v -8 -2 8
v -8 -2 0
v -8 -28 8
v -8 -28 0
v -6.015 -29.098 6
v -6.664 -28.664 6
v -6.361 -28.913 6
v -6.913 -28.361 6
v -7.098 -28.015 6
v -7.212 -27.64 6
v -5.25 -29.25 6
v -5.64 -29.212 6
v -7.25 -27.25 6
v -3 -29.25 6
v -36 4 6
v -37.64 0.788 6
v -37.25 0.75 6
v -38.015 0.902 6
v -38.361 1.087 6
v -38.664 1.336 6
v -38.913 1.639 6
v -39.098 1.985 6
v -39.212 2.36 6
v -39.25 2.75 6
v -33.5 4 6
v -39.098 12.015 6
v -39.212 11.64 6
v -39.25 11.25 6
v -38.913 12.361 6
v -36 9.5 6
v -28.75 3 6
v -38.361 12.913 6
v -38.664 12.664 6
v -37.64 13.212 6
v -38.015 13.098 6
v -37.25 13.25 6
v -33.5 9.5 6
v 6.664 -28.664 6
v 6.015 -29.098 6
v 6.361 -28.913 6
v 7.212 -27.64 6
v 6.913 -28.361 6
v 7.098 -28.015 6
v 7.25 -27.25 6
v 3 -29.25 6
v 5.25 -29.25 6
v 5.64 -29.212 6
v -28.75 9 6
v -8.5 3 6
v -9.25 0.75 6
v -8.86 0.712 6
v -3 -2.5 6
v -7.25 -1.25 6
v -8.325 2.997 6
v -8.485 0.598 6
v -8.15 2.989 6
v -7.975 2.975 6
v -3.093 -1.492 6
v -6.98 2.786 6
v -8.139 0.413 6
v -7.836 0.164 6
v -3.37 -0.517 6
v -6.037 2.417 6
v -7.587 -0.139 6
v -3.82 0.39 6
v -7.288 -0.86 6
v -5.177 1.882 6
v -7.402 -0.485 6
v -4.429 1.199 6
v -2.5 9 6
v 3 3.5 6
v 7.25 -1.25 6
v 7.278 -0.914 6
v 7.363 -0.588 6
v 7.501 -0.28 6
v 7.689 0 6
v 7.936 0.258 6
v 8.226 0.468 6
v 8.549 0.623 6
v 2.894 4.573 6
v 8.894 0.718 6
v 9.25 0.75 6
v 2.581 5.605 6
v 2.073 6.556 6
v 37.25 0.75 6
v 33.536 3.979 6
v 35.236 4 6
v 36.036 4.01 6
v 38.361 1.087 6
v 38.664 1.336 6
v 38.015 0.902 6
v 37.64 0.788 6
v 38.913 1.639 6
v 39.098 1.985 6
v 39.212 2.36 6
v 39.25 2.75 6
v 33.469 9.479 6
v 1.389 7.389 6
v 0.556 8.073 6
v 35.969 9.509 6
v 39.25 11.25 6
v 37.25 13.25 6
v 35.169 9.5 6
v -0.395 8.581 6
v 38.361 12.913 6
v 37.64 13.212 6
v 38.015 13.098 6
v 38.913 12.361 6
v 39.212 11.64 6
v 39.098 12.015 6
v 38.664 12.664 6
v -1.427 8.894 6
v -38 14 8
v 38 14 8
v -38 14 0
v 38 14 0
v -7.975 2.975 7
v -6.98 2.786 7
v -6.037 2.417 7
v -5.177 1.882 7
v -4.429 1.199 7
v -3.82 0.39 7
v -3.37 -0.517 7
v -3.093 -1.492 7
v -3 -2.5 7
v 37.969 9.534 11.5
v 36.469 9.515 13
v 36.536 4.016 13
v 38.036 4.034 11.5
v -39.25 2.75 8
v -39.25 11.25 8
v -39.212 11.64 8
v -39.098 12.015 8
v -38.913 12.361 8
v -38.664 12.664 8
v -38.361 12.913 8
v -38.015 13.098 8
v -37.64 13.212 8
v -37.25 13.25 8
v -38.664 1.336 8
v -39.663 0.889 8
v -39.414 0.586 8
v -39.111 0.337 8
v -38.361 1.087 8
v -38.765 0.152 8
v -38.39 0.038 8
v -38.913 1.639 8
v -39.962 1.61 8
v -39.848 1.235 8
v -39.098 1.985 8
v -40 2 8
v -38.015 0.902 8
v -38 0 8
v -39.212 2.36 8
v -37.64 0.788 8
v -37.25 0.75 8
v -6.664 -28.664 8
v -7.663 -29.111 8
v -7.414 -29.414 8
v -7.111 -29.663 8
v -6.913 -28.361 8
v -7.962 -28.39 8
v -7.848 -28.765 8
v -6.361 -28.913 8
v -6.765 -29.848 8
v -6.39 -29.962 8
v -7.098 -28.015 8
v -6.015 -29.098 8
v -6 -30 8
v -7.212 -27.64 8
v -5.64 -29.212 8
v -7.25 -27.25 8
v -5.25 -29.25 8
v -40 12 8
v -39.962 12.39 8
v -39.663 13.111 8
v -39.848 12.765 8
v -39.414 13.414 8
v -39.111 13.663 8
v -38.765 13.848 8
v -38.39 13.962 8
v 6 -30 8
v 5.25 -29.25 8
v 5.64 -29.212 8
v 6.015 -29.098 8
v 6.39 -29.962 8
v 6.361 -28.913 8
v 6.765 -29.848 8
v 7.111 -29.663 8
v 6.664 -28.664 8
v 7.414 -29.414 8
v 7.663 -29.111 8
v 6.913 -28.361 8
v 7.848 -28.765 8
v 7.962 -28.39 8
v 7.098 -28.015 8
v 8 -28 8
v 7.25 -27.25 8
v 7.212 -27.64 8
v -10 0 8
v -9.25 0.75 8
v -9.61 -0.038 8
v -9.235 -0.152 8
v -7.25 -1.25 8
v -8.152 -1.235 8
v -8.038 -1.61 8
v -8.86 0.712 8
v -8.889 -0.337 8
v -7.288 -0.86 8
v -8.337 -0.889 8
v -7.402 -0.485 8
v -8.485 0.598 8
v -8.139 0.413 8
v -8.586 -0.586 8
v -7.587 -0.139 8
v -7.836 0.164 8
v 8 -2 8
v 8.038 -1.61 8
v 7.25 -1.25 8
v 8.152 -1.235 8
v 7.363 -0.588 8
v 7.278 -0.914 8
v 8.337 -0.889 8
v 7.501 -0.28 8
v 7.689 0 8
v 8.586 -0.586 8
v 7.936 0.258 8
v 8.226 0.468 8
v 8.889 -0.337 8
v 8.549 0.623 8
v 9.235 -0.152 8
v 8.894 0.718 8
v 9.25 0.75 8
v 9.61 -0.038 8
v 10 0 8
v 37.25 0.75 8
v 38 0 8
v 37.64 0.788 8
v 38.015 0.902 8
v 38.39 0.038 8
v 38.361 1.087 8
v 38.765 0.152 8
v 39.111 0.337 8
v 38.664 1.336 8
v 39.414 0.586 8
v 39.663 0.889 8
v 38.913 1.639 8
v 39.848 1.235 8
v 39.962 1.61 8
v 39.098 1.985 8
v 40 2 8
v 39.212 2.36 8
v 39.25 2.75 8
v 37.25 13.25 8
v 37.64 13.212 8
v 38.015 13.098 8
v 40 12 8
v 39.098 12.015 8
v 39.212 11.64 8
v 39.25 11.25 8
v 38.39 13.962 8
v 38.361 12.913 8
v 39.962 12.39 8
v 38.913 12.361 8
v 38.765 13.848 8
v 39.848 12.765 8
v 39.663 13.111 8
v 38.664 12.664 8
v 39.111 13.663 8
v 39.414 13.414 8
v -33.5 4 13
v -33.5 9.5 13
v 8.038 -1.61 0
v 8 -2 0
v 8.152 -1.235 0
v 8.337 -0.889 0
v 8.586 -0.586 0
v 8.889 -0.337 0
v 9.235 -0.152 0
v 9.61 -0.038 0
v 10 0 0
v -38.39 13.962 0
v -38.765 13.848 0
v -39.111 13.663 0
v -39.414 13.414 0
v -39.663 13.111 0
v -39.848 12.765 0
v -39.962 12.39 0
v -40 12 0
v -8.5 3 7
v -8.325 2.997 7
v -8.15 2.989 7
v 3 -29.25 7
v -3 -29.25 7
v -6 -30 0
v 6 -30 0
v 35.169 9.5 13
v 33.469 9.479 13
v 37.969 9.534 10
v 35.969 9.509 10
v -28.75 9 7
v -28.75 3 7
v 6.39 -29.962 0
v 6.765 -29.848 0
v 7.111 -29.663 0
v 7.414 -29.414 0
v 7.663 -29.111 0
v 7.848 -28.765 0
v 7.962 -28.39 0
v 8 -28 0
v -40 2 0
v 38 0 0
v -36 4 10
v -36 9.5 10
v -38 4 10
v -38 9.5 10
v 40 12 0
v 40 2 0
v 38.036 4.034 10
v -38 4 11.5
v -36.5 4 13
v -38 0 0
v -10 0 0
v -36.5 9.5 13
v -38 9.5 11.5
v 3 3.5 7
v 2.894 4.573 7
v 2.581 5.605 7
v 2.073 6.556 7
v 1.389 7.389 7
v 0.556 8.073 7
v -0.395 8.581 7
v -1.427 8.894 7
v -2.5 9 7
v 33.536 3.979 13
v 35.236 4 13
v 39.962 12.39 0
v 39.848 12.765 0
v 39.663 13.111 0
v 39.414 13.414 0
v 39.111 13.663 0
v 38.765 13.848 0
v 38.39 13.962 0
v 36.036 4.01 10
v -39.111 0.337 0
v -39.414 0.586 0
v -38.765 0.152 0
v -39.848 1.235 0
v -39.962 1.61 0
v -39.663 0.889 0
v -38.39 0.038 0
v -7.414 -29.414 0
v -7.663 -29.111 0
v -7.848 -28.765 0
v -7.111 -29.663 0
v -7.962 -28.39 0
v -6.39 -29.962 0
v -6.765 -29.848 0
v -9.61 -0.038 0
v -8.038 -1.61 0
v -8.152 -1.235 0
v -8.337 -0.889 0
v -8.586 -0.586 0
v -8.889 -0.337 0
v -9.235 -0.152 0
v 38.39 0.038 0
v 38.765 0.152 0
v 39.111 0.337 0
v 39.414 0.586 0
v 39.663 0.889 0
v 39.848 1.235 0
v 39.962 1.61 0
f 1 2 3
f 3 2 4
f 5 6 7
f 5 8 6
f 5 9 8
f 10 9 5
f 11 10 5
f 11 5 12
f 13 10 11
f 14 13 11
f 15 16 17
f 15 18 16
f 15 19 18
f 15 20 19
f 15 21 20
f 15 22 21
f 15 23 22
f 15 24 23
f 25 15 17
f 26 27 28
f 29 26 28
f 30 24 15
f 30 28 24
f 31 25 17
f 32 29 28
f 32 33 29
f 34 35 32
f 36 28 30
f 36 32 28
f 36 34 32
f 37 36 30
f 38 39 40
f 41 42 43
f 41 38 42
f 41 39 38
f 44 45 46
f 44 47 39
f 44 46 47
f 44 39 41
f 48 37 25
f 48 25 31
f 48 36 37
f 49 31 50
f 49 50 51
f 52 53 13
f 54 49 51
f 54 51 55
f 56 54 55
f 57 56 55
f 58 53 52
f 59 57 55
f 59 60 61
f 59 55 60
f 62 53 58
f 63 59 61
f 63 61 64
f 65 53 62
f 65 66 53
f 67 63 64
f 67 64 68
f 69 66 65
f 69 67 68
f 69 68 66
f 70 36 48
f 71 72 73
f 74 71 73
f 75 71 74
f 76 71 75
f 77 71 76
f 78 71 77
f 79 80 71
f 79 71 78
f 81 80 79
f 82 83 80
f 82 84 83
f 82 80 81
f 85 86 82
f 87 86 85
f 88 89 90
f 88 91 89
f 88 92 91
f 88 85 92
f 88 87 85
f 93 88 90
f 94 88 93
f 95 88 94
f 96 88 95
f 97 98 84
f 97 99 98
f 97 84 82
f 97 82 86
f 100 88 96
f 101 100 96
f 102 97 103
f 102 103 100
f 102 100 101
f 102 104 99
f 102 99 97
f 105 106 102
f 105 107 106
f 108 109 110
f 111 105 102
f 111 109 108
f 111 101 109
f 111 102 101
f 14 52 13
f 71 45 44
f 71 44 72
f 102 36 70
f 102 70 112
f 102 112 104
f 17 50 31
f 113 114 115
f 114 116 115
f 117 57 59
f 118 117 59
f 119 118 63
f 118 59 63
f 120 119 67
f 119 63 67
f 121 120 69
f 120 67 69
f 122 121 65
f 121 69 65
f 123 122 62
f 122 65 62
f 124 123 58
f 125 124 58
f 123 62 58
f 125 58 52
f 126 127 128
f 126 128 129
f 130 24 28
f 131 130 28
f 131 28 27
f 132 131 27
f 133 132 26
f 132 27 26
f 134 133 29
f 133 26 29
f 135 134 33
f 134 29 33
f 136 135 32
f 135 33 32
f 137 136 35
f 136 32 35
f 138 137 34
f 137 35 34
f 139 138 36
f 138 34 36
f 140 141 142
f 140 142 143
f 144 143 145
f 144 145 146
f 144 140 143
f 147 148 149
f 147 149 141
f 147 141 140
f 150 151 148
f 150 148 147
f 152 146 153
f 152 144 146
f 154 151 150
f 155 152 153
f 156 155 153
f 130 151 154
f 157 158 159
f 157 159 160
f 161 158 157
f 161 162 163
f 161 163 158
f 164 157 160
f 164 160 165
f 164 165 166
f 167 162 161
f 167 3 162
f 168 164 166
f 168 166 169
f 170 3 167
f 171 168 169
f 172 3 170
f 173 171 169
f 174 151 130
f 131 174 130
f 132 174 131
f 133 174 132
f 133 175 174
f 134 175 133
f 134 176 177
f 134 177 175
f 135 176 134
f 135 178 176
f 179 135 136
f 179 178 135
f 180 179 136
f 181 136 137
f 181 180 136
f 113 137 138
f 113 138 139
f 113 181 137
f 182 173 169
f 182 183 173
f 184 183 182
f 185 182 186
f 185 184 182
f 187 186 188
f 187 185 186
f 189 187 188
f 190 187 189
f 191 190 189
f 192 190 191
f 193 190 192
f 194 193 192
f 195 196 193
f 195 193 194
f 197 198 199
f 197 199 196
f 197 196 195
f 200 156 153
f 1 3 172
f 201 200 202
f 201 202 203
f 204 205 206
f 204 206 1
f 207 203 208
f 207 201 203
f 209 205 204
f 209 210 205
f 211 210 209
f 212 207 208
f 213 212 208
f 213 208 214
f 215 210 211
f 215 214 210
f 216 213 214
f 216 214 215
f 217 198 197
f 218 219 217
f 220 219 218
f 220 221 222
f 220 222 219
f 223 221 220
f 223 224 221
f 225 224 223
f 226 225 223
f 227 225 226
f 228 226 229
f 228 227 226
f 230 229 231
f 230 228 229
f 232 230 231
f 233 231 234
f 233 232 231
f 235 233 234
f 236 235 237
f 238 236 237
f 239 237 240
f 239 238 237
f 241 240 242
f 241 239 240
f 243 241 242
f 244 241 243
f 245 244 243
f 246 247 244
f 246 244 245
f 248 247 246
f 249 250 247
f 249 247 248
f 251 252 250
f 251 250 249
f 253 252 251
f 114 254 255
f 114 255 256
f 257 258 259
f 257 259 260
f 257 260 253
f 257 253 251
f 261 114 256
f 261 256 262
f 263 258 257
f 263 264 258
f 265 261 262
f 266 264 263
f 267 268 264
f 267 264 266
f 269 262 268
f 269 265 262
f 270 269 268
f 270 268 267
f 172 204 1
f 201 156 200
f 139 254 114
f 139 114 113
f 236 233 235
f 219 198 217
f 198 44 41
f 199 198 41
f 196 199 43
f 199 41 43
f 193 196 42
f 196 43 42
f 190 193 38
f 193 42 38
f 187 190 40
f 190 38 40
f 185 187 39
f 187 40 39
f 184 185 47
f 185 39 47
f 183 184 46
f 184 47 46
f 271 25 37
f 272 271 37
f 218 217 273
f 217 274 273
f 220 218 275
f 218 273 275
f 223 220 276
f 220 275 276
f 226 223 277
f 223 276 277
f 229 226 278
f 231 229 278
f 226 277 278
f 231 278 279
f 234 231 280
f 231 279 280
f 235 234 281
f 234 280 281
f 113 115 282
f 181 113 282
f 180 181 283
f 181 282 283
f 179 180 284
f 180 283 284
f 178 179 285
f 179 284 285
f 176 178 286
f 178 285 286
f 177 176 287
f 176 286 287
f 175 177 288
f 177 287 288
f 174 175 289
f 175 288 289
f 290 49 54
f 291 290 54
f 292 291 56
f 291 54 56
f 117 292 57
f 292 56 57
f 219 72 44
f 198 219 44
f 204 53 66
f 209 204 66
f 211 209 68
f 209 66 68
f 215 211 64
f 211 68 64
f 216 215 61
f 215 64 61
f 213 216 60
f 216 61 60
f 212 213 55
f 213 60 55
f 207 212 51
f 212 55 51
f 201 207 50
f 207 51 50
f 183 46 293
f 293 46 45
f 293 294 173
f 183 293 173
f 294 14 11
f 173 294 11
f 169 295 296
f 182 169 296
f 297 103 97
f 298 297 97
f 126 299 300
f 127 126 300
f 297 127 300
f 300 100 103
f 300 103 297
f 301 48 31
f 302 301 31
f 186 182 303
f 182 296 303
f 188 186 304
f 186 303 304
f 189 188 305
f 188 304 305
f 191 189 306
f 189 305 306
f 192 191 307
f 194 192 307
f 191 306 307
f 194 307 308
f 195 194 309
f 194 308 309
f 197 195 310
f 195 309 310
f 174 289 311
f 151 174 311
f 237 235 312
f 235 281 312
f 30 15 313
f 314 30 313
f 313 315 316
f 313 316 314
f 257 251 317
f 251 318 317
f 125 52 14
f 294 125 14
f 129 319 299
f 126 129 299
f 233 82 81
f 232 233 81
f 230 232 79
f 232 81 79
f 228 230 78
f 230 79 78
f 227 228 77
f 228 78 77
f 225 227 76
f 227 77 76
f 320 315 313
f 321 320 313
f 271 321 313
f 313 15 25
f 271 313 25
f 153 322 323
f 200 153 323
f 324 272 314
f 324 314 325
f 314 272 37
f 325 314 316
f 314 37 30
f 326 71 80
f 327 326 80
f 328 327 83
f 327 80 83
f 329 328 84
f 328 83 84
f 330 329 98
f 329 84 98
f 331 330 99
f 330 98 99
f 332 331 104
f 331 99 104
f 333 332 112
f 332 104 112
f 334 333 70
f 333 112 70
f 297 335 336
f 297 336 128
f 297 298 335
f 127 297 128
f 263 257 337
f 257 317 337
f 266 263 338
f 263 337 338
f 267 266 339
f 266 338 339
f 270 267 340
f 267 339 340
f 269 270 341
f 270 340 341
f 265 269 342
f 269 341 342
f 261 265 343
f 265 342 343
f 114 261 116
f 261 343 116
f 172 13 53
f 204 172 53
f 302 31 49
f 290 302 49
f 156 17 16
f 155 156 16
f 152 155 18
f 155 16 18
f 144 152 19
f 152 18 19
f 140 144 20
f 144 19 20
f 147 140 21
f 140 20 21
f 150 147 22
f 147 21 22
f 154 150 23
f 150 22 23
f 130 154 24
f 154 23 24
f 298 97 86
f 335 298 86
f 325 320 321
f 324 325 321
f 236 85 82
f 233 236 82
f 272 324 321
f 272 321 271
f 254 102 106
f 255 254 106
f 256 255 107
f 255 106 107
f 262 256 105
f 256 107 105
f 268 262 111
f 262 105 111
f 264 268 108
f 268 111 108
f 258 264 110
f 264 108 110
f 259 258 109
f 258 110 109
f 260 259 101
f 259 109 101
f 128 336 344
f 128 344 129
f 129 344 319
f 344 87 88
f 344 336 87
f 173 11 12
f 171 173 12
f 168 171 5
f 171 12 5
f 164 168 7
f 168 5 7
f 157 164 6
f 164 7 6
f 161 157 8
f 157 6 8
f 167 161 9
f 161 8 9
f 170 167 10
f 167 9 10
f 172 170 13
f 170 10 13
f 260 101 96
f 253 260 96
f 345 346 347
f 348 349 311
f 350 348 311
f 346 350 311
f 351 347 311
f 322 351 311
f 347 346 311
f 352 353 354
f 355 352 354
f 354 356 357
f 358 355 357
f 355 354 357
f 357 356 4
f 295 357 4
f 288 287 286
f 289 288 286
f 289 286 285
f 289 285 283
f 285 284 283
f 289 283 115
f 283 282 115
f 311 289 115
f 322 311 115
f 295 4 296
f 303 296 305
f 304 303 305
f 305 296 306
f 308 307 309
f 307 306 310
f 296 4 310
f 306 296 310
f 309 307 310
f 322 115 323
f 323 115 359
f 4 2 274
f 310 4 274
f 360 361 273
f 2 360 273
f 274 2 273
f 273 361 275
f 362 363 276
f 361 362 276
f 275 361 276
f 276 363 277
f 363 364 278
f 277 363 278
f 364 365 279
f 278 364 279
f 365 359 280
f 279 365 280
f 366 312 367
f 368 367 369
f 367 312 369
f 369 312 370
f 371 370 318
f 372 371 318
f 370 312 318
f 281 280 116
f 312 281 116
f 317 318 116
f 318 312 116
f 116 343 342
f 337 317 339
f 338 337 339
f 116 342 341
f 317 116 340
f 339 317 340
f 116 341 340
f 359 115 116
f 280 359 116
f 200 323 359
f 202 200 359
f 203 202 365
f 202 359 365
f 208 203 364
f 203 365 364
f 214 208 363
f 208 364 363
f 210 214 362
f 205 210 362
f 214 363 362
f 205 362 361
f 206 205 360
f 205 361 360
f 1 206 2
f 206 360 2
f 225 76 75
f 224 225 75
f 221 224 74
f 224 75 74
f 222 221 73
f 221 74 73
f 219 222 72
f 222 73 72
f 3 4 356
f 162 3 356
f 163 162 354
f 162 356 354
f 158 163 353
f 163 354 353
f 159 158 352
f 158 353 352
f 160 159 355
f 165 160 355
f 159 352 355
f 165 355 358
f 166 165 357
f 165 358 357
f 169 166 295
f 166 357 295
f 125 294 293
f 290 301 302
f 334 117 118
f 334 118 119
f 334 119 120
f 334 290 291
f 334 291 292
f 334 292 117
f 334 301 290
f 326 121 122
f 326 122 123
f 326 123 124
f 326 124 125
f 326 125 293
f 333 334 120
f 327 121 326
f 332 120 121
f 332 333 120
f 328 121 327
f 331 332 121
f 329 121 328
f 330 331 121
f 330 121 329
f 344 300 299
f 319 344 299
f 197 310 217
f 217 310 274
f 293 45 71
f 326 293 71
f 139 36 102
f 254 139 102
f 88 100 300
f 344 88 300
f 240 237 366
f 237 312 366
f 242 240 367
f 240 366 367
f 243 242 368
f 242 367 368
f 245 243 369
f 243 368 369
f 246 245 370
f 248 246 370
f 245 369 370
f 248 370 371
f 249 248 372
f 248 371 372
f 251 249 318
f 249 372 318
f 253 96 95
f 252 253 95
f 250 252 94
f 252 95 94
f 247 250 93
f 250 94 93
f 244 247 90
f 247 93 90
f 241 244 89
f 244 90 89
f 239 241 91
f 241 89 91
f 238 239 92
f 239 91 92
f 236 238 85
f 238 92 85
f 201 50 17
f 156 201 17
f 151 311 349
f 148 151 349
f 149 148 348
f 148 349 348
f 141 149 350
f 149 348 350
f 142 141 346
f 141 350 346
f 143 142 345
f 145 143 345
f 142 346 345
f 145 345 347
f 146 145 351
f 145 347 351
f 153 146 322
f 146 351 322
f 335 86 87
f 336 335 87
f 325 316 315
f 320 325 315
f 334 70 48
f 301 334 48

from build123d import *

# Parameters (mm, degrees)
F1_DEPTH  = 6
F3_DEPTH  = 1
F5_DEPTH  = 7
F7_DEPTH  = 2
F8_W      = 2
F8_H      = 4
F9_DEPTH  = 6
F10_W     = 2
F10_H     = 4
F11_DEPTH = 6


with BuildPart() as f1:
    # F0 (on Top) → F1 (new body)
    with BuildSketch(Plane.XY):
        with BuildLine():
            Line((-35, 0), (-12, 0))
            Line((-12, 0), (-10, 0))
            ThreePointArc((-10, 0), (-8.5857864376, -0.5857864376), (-8, -2))
            Line((-8, -2), (-8, -28))
            ThreePointArc((-8, -28), (-7.4142135624, -29.4142135624), (-6, -30))
            Line((-6, -30), (0, -30))
            Line((0, -30), (6, -30))
            ThreePointArc((6, -30), (7.4142135624, -29.4142135624), (8, -28))
            Line((8, -28), (8, -2))
            ThreePointArc((8, -2), (8.5857864376, -0.5857864376), (10, 0))
            Line((10, 0), (35, 0))
            ThreePointArc((35, 0), (36.4142135624, 0.5857864376), (37, 2))
            Line((37, 2), (37, 12))
            ThreePointArc((37, 12), (36.4142135624, 13.4142135624), (35, 14))
            Line((35, 14), (-35, 14))
            ThreePointArc((-35, 14), (-36.4142135624, 13.4142135624), (-37, 12))
            Line((-37, 12), (-37, 2))
            ThreePointArc((-37, 2), (-36.4142135624, 0.5857864376), (-35, 0))
        make_face()
        with BuildLine():
            Line((-38, 0), (-35, 0))
            ThreePointArc((-35, 0), (-36.4142135624, 0.5857864376), (-37, 2))
            Line((-37, 2), (-37, 12))
            ThreePointArc((-37, 12), (-36.4142135624, 13.4142135624), (-35, 14))
            Line((-35, 14), (-38, 14))
            ThreePointArc((-38, 14), (-39.4142135624, 13.4142135624), (-40, 12))
            Line((-40, 12), (-40, 2))
            ThreePointArc((-40, 2), (-39.4142135624, 0.5857864376), (-38, 0))
        make_face()
        with BuildLine():
            Line((38, 14), (35, 14))
            ThreePointArc((35, 14), (36.4142135624, 13.4142135624), (37, 12))
            Line((37, 12), (37, 2))
            ThreePointArc((37, 2), (36.4142135624, 0.5857864376), (35, 0))
            Line((35, 0), (37, 0))
            Line((37, 0), (38, 0))
            ThreePointArc((38, 0), (39.4142135624, 0.5857864376), (40, 2))
            Line((40, 2), (40, 12))
            ThreePointArc((40, 12), (39.4142135624, 13.4142135624), (38, 14))
        make_face()
    extrude(amount=F1_DEPTH)

    # F2 (on face) → F3 (join)
    with BuildSketch(Plane.XY.offset(6)):
        with BuildLine():
            Line((-3, -2.5), (-3, -30))
            Line((-3, -30), (3, -30))
            Line((3, -30), (3, 3.5))
            ThreePointArc((3, 3.5), (1.3890872965, 7.3890872965), (-2.5, 9))
            Line((-2.5, 9), (-28.75, 9))
            Line((-28.75, 9), (-28.75, 3))
            Line((-28.75, 3), (-8.5, 3))
            ThreePointArc((-8.5, 3), (-8.2371364782, 2.9937148423), (-7.9748737342, 2.9748737342))
            ThreePointArc((-7.9748737342, 2.9748737342), (-4.4294844023, 1.1987704401), (-3, -2.5))
        make_face()
    extrude(amount=F3_DEPTH)

    # F4 (on face) → F5 (join)
    with BuildSketch(Plane.XY.offset(6)):
        Polygon((35.2363081181, 4), (38.0360990062, 4.034219625), (37.9688818856, 9.5338088696), (35.1690909975, 9.4995892445), (33.4692179582, 9.4788130436), (33.5364350788, 3.9792237991), align=None)
        Polygon((-38, 9.5), (-38, 4), (-35.2, 4), (-33.5, 4), (-33.5, 9.5), align=None)
    extrude(amount=F5_DEPTH)

    # F6 (on face) → F7 (join)
    with BuildSketch(Plane.XY.offset(6)):
        with BuildLine():
            Line((-6, -30), (0, -30))
            Line((0, -30), (6, -30))
            ThreePointArc((6, -30), (7.4142135624, -29.4142135624), (8, -28))
            Line((8, -28), (8, -2))
            ThreePointArc((8, -2), (8.5857864376, -0.5857864376), (10, 0))
            Line((10, 0), (38, 0))
            ThreePointArc((38, 0), (39.4142135624, 0.5857864376), (40, 2))
            Line((40, 2), (40, 12))
            ThreePointArc((40, 12), (39.4142135624, 13.4142135624), (38, 14))
            Line((38, 14), (-38, 14))
            ThreePointArc((-38, 14), (-39.4142135624, 13.4142135624), (-40, 12))
            Line((-40, 12), (-40, 2))
            ThreePointArc((-40, 2), (-39.4142135624, 0.5857864376), (-38, 0))
            Line((-38, 0), (-10, 0))
            ThreePointArc((-10, 0), (-8.5857864376, -0.5857864376), (-8, -2))
            Line((-8, -2), (-8, -28))
            ThreePointArc((-8, -28), (-7.4142135624, -29.4142135624), (-6, -30))
        make_face()
        with BuildLine():
            Line((5.25, -29.25), (0, -29.25))
            Line((0, -29.25), (-5.25, -29.25))
            ThreePointArc((-5.25, -29.25), (-6.6642135624, -28.6642135624), (-7.25, -27.25))
            Line((-7.25, -27.25), (-7.25, -16.2867717445))
            Line((-7.25, -16.2867717445), (-7.25, -1.25))
            ThreePointArc((-7.25, -1.25), (-7.8357864376, 0.1642135624), (-9.25, 0.75))
            Line((-9.25, 0.75), (-28.4743793309, 0.75))
            Line((-28.4743793309, 0.75), (-37.25, 0.75))
            ThreePointArc((-37.25, 0.75), (-38.6642135624, 1.3357864376), (-39.25, 2.75))
            Line((-39.25, 2.75), (-39.25, 11.25))
            ThreePointArc((-39.25, 11.25), (-38.6642135624, 12.6642135624), (-37.25, 13.25))
            Line((-37.25, 13.25), (23.7047821283, 13.25))
            Line((23.7047821283, 13.25), (37.25, 13.25))
            ThreePointArc((37.25, 13.25), (38.6642135624, 12.6642135624), (39.25, 11.25))
            Line((39.25, 11.25), (39.25, 2.75))
            ThreePointArc((39.25, 2.75), (38.6642135624, 1.3357864376), (37.25, 0.75))
            Line((37.25, 0.75), (9.25, 0.75))
            ThreePointArc((9.25, 0.75), (8.3839745962, 0.5527756377), (7.6887505004, 0))
            ThreePointArc((7.6887505004, 0), (7.3628726859, -0.5876175573), (7.25, -1.25))
            Line((7.25, -1.25), (7.25, -27.25))
            ThreePointArc((7.25, -27.25), (6.6642135624, -28.6642135624), (5.25, -29.25))
        make_face(mode=Mode.SUBTRACT)
    extrude(amount=F7_DEPTH)

    # F8 (on face) → F9 (cut)
    with BuildSketch(Plane(origin=(-0.0436186312, 3.5688014166, 0), x_dir=(0.9999253172, 0.0122212947, 0), z_dir=(0.0122212947, -0.9999253172, 0))):
        Polygon((38.0825617502, 13), (36.5825617502, 13), (38.0825617502, 11.5), align=None)
        with Locations((37.0825617502, 8)):
            Rectangle(F8_W, F8_H)
    extrude(amount=-F9_DEPTH, mode=Mode.SUBTRACT)

    # F10 (on face) → F11 (cut)
    with BuildSketch(Plane.XZ.offset(-4)):
        with Locations((-37, 8)):
            Rectangle(F10_W, F10_H)
        Polygon((-38, 11.5), (-36.5, 13), (-38, 13), align=None)
    extrude(amount=-F11_DEPTH, mode=Mode.SUBTRACT)


solid = f1.part
